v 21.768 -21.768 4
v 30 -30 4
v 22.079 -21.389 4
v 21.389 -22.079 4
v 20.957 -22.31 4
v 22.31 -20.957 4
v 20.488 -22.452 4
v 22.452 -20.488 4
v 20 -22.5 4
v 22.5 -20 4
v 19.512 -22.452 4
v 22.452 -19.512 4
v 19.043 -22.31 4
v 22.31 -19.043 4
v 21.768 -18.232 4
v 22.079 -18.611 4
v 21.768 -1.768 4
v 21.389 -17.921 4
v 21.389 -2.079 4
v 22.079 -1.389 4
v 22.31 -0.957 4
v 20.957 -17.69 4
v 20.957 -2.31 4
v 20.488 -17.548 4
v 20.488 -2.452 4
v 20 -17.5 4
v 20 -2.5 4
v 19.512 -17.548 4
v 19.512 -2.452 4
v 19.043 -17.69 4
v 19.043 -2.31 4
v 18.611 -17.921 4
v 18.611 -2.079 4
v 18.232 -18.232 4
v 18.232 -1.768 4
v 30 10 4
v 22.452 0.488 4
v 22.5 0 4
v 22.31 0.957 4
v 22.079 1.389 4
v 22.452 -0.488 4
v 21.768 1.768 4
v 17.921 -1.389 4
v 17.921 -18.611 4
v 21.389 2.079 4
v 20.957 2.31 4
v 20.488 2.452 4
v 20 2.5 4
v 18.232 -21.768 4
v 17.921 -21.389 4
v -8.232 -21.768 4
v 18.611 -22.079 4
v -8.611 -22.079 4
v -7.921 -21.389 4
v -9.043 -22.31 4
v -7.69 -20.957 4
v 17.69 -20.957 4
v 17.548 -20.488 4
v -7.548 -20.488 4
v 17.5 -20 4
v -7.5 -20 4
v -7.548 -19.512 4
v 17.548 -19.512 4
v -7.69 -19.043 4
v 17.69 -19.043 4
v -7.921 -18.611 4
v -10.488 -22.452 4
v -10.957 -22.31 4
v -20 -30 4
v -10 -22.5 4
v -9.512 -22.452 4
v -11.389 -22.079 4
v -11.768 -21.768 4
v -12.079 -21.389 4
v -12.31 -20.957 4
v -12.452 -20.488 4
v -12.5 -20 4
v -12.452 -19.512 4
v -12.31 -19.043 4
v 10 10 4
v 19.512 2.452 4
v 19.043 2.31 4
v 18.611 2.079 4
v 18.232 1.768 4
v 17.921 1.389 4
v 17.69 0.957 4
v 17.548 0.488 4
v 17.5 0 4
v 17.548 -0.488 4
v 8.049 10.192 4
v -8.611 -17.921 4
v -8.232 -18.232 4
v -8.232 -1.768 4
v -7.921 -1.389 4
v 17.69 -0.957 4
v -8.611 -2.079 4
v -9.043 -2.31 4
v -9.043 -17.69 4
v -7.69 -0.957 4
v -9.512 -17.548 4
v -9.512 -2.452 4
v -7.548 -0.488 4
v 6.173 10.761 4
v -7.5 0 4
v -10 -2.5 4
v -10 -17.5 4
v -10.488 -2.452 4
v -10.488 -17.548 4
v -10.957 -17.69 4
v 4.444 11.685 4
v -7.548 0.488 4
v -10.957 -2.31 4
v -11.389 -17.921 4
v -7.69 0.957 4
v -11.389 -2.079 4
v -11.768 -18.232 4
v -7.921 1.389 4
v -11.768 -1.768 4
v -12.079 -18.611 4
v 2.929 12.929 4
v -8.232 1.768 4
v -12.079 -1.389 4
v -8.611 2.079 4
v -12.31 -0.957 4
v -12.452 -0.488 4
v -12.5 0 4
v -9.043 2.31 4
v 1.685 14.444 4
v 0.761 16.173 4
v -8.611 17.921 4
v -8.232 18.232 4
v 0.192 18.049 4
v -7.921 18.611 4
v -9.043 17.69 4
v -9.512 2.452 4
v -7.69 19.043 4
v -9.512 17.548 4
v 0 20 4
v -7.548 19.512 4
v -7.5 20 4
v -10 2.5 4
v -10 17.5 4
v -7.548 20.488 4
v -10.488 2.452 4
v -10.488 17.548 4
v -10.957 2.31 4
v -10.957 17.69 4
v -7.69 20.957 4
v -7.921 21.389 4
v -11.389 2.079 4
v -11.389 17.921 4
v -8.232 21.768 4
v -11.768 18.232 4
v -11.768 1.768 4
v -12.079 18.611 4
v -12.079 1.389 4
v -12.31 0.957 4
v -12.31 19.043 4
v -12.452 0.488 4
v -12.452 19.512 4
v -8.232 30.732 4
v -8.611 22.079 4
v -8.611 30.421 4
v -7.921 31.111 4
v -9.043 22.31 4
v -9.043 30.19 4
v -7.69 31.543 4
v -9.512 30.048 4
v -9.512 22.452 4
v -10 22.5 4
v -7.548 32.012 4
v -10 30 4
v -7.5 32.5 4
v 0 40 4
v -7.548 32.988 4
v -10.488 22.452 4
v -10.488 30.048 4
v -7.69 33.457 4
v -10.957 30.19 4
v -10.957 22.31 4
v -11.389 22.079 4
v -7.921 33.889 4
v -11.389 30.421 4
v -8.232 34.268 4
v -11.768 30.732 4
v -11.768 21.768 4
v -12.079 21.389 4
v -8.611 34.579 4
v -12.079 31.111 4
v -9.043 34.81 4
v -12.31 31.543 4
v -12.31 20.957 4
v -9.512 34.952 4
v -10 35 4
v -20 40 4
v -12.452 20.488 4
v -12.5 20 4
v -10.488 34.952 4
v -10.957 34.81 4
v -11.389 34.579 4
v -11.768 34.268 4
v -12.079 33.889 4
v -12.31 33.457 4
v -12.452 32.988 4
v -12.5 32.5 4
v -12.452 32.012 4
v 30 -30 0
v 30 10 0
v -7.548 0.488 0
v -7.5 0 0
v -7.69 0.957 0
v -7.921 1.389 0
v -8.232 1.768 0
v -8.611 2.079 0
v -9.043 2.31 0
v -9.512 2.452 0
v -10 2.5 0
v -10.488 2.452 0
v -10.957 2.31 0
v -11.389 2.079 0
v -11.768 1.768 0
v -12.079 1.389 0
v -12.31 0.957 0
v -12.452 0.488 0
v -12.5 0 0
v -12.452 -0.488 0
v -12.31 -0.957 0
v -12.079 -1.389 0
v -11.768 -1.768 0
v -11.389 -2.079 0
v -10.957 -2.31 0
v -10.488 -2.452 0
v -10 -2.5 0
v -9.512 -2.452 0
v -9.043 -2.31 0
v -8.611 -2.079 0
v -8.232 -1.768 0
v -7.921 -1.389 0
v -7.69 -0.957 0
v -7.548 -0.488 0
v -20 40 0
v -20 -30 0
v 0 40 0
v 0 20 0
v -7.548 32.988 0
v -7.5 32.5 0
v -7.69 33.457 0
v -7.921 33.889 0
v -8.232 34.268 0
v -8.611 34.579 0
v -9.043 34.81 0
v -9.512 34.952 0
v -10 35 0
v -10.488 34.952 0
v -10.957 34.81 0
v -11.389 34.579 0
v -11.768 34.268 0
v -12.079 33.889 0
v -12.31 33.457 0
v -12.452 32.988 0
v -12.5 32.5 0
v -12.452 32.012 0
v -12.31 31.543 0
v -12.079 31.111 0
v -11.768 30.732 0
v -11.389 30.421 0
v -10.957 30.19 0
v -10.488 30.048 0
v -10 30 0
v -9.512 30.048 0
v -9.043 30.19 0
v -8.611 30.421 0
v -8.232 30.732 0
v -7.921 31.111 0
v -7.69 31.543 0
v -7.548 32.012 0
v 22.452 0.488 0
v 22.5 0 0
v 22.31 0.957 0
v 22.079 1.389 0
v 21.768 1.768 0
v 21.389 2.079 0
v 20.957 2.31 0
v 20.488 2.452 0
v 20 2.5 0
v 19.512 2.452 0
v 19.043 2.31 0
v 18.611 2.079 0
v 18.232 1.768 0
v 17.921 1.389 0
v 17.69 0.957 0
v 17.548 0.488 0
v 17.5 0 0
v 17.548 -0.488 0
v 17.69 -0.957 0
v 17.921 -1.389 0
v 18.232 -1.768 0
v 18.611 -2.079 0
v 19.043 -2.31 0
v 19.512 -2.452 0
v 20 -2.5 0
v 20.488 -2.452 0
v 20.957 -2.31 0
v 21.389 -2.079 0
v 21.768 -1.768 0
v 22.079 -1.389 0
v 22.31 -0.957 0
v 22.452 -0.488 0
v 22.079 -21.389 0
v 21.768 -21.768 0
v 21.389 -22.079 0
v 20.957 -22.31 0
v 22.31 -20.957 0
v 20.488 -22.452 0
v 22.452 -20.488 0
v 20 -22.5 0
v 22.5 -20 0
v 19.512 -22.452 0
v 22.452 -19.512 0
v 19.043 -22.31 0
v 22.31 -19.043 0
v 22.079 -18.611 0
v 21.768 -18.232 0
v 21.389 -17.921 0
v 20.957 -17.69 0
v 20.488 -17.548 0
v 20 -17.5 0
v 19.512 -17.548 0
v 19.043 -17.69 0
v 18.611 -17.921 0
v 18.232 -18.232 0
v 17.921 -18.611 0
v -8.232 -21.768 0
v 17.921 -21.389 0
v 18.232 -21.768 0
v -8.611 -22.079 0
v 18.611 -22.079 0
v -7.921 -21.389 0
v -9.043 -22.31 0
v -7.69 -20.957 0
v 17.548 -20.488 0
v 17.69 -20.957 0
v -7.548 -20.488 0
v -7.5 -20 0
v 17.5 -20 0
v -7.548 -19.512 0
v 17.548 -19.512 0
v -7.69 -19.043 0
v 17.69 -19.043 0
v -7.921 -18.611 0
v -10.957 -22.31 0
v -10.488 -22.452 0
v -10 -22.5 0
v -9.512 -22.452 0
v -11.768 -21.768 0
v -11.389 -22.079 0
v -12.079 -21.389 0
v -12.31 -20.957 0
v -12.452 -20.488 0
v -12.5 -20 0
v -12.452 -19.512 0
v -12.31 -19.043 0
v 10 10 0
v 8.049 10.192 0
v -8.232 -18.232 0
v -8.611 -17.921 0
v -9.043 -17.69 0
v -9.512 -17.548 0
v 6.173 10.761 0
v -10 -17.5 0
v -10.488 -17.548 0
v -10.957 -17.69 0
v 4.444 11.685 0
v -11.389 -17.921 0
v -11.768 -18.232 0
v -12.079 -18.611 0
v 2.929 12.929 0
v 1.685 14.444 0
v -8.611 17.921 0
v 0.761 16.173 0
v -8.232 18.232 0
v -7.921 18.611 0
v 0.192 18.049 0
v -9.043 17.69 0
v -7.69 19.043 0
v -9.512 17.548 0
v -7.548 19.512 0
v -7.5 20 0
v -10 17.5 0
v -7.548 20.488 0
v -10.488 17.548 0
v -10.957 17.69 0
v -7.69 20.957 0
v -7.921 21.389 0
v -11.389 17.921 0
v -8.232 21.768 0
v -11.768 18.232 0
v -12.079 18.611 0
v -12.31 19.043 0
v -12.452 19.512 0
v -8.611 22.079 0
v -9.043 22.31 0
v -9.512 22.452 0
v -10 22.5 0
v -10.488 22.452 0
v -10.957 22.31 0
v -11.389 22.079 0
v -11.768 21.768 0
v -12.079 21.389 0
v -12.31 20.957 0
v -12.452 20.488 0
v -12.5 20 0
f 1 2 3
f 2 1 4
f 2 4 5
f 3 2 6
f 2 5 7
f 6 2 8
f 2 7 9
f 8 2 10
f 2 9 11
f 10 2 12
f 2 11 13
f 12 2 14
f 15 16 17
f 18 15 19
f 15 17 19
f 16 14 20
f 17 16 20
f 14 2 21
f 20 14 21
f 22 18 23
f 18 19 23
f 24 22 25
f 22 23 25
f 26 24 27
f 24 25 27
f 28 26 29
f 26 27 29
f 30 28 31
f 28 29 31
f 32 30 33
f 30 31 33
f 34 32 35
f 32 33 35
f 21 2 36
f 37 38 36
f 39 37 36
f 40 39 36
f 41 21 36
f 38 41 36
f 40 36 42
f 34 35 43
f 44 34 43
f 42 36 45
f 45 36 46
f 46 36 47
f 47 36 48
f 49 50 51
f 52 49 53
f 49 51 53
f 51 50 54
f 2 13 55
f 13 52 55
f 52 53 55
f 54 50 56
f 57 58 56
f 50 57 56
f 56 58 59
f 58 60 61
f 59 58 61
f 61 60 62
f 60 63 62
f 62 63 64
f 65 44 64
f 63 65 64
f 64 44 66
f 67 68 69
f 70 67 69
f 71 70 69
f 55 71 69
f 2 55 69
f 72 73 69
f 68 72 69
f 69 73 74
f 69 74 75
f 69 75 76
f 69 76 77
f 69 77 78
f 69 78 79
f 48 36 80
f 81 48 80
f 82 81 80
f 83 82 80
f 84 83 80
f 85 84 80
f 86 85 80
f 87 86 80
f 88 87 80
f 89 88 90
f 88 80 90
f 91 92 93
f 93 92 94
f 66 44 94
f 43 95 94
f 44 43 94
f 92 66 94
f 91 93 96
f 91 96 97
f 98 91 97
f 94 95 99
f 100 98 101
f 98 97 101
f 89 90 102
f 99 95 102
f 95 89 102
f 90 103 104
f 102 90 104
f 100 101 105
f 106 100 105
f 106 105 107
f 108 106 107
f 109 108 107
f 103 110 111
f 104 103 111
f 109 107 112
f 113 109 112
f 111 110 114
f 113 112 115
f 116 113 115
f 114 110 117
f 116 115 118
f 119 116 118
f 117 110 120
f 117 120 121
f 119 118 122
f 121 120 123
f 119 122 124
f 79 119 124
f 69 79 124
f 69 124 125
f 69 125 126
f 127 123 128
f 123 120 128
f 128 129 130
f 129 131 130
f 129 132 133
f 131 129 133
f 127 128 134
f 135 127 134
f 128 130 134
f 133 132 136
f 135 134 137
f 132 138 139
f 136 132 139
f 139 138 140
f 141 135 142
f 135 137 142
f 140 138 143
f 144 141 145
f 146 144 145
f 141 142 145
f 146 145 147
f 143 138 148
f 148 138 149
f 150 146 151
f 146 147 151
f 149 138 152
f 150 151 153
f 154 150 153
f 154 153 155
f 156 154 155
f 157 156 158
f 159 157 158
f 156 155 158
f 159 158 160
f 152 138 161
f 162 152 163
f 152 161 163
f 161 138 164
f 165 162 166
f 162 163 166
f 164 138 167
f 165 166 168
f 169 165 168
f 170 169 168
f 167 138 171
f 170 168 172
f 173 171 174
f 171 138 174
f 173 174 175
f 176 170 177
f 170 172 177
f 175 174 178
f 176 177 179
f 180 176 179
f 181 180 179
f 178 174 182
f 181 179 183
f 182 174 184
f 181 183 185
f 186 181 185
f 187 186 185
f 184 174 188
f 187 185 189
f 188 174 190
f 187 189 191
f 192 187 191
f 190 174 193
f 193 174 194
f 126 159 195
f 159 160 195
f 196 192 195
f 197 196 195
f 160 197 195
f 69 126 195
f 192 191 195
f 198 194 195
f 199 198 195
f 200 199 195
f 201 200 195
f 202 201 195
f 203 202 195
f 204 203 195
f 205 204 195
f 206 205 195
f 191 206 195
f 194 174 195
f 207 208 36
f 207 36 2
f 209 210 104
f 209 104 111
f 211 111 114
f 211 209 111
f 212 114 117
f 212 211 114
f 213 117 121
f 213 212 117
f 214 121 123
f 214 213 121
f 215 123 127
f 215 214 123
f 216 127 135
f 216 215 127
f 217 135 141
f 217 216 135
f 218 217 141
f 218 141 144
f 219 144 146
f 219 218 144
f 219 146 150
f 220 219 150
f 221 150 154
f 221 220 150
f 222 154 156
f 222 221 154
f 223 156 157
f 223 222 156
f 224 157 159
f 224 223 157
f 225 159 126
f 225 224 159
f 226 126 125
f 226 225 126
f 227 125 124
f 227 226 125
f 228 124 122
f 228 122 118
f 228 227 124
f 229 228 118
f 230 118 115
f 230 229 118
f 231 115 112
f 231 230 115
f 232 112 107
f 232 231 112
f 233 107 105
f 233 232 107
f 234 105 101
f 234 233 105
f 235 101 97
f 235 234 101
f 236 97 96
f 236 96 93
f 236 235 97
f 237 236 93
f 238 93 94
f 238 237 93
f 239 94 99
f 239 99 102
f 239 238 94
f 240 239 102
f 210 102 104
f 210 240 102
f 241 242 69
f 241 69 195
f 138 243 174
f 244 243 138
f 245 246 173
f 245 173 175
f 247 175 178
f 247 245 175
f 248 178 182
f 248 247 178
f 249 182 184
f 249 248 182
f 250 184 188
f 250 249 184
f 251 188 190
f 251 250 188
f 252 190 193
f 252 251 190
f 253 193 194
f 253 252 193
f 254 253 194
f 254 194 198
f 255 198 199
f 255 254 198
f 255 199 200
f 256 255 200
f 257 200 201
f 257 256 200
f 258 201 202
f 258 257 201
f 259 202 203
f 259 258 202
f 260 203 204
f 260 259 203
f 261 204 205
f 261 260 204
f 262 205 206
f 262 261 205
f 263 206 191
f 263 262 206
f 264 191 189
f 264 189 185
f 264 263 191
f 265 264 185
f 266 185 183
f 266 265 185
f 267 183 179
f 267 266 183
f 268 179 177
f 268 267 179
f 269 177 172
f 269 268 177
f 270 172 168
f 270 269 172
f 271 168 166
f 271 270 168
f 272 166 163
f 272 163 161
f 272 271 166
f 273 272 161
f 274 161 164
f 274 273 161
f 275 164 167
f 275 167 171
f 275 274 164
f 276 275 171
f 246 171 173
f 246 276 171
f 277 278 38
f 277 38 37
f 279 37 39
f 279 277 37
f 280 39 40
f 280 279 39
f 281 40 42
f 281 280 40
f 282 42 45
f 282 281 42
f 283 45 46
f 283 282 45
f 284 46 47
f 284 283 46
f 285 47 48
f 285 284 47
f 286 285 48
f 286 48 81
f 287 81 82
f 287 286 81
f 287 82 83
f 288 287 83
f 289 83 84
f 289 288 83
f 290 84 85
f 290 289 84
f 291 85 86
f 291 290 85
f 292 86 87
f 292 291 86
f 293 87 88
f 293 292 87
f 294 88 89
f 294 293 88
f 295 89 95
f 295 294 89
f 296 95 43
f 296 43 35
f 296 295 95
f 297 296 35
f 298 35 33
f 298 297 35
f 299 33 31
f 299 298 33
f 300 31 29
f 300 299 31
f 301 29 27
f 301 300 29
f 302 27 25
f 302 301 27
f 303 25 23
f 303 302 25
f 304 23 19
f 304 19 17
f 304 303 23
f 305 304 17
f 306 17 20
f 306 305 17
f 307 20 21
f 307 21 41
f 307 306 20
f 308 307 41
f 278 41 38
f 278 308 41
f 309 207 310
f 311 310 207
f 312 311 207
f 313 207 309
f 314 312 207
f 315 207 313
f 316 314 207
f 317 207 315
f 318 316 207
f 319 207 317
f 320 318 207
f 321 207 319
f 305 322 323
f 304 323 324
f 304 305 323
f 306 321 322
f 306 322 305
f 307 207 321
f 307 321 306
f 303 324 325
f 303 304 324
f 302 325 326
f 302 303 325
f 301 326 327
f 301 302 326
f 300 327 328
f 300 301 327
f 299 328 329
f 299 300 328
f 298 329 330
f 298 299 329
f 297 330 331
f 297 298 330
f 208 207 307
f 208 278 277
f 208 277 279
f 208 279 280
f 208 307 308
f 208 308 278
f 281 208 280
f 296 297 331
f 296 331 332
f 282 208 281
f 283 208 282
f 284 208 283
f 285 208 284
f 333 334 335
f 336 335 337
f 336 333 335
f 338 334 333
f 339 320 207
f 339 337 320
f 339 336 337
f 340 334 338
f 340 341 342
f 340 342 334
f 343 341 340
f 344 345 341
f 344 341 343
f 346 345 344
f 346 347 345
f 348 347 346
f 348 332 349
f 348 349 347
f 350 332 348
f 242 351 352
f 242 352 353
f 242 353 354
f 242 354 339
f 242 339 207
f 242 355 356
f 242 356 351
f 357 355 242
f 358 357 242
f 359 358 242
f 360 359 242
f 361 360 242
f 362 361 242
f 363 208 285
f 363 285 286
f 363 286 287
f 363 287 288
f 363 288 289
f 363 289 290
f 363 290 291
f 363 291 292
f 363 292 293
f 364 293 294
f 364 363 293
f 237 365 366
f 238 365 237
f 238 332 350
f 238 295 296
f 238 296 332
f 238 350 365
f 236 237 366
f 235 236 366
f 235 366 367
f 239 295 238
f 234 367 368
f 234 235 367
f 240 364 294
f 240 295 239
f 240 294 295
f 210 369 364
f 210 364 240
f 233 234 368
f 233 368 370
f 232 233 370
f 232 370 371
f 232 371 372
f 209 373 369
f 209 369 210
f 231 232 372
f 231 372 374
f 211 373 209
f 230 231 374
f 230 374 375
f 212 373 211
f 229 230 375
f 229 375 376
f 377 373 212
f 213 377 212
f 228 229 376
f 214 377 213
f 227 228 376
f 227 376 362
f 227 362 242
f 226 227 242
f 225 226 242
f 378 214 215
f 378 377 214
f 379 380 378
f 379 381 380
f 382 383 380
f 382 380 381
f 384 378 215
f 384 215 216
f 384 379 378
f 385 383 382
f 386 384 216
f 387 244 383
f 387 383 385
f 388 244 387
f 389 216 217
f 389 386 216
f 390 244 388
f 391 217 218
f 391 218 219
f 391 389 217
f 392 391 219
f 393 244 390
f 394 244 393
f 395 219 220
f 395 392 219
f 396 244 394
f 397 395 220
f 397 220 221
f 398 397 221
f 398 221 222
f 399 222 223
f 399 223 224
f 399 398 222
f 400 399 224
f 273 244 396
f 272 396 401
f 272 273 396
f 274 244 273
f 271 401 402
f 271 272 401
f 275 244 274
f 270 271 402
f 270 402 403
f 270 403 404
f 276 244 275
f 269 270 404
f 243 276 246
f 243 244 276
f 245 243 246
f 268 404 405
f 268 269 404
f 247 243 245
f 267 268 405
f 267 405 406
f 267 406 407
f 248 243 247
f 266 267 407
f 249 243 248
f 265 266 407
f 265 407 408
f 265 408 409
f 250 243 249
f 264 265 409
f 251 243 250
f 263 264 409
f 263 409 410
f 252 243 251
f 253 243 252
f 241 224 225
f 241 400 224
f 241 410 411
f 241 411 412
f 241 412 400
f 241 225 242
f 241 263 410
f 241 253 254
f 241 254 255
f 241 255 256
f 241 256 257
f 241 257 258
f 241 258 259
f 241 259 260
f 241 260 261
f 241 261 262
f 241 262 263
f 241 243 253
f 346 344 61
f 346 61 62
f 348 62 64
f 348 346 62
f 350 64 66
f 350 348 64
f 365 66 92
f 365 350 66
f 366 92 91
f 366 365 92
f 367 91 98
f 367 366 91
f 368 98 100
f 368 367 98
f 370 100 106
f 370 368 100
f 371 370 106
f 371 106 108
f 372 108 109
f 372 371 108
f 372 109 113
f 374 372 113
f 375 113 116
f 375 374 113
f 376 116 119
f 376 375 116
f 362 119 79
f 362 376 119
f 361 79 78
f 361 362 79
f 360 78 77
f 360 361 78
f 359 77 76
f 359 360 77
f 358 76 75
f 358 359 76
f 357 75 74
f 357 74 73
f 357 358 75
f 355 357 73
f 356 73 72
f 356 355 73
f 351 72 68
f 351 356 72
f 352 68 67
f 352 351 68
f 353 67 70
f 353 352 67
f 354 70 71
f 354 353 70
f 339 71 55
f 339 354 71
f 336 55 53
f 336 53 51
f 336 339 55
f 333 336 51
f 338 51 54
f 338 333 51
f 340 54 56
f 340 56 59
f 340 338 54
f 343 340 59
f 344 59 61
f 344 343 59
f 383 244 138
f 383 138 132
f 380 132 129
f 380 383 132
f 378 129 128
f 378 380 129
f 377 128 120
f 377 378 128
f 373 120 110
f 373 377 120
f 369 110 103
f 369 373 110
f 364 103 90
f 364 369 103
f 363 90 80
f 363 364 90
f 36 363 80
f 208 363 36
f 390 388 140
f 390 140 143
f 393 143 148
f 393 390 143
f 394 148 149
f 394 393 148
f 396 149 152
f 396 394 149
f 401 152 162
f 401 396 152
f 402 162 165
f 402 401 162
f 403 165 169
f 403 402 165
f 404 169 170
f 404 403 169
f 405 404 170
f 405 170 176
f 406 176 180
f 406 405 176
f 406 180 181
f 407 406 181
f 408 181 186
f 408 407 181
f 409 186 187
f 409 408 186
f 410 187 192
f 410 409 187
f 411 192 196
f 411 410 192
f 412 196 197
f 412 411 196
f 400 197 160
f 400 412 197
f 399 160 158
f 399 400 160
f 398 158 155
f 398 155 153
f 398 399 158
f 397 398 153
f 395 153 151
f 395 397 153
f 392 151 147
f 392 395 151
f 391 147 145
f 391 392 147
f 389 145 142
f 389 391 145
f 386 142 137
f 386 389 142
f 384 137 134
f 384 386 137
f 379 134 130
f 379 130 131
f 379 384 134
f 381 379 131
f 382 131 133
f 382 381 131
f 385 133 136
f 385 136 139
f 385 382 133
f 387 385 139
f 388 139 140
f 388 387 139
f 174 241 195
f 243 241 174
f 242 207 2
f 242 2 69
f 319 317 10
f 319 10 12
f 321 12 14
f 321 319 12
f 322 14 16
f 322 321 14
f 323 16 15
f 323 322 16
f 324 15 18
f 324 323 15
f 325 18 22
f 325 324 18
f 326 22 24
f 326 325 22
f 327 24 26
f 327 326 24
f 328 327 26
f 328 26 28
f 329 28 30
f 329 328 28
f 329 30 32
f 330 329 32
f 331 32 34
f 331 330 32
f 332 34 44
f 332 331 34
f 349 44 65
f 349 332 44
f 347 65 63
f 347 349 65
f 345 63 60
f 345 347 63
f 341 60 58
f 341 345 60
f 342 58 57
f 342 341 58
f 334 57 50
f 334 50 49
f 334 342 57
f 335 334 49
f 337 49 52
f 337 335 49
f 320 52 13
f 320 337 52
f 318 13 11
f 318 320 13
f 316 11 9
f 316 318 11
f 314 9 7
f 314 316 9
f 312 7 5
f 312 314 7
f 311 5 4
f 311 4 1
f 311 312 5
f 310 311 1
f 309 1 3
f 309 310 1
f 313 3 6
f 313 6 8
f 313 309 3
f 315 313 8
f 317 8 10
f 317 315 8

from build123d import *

# Parameters (mm, degrees)
SKETCH1_R           = 2.5
BOSS_EXTRUDE1_DEPTH = 4


with BuildPart() as part:
    # Sketch1 → Boss-Extrude1 (new body)
    with BuildSketch(Plane.XY):
        with BuildLine():
            Line((-20, -30), (-20, 40))
            Line((-20, 40), (0, 40))
            Line((0, 40), (0, 20))
            ThreePointArc((0, 20), (2.928932188, 12.928932188), (10, 10))
            Line((10, 10), (30, 10))
            Line((30, 10), (30, -30))
            Line((30, -30), (-20, -30))
        make_face()
        with Locations((-10, 32.5)):
            Circle(SKETCH1_R, mode=Mode.SUBTRACT)
        with Locations((-10, 0)):
            Circle(SKETCH1_R, mode=Mode.SUBTRACT)
        with Locations((-10, -20)):
            Circle(SKETCH1_R, mode=Mode.SUBTRACT)
        with Locations((20, 0)):
            Circle(SKETCH1_R, mode=Mode.SUBTRACT)
        with Locations((20, -20)):
            Circle(SKETCH1_R, mode=Mode.SUBTRACT)
        with Locations((-10, 20)):
            Circle(SKETCH1_R, mode=Mode.SUBTRACT)
    extrude(amount=BOSS_EXTRUDE1_DEPTH)


solid = part.part
